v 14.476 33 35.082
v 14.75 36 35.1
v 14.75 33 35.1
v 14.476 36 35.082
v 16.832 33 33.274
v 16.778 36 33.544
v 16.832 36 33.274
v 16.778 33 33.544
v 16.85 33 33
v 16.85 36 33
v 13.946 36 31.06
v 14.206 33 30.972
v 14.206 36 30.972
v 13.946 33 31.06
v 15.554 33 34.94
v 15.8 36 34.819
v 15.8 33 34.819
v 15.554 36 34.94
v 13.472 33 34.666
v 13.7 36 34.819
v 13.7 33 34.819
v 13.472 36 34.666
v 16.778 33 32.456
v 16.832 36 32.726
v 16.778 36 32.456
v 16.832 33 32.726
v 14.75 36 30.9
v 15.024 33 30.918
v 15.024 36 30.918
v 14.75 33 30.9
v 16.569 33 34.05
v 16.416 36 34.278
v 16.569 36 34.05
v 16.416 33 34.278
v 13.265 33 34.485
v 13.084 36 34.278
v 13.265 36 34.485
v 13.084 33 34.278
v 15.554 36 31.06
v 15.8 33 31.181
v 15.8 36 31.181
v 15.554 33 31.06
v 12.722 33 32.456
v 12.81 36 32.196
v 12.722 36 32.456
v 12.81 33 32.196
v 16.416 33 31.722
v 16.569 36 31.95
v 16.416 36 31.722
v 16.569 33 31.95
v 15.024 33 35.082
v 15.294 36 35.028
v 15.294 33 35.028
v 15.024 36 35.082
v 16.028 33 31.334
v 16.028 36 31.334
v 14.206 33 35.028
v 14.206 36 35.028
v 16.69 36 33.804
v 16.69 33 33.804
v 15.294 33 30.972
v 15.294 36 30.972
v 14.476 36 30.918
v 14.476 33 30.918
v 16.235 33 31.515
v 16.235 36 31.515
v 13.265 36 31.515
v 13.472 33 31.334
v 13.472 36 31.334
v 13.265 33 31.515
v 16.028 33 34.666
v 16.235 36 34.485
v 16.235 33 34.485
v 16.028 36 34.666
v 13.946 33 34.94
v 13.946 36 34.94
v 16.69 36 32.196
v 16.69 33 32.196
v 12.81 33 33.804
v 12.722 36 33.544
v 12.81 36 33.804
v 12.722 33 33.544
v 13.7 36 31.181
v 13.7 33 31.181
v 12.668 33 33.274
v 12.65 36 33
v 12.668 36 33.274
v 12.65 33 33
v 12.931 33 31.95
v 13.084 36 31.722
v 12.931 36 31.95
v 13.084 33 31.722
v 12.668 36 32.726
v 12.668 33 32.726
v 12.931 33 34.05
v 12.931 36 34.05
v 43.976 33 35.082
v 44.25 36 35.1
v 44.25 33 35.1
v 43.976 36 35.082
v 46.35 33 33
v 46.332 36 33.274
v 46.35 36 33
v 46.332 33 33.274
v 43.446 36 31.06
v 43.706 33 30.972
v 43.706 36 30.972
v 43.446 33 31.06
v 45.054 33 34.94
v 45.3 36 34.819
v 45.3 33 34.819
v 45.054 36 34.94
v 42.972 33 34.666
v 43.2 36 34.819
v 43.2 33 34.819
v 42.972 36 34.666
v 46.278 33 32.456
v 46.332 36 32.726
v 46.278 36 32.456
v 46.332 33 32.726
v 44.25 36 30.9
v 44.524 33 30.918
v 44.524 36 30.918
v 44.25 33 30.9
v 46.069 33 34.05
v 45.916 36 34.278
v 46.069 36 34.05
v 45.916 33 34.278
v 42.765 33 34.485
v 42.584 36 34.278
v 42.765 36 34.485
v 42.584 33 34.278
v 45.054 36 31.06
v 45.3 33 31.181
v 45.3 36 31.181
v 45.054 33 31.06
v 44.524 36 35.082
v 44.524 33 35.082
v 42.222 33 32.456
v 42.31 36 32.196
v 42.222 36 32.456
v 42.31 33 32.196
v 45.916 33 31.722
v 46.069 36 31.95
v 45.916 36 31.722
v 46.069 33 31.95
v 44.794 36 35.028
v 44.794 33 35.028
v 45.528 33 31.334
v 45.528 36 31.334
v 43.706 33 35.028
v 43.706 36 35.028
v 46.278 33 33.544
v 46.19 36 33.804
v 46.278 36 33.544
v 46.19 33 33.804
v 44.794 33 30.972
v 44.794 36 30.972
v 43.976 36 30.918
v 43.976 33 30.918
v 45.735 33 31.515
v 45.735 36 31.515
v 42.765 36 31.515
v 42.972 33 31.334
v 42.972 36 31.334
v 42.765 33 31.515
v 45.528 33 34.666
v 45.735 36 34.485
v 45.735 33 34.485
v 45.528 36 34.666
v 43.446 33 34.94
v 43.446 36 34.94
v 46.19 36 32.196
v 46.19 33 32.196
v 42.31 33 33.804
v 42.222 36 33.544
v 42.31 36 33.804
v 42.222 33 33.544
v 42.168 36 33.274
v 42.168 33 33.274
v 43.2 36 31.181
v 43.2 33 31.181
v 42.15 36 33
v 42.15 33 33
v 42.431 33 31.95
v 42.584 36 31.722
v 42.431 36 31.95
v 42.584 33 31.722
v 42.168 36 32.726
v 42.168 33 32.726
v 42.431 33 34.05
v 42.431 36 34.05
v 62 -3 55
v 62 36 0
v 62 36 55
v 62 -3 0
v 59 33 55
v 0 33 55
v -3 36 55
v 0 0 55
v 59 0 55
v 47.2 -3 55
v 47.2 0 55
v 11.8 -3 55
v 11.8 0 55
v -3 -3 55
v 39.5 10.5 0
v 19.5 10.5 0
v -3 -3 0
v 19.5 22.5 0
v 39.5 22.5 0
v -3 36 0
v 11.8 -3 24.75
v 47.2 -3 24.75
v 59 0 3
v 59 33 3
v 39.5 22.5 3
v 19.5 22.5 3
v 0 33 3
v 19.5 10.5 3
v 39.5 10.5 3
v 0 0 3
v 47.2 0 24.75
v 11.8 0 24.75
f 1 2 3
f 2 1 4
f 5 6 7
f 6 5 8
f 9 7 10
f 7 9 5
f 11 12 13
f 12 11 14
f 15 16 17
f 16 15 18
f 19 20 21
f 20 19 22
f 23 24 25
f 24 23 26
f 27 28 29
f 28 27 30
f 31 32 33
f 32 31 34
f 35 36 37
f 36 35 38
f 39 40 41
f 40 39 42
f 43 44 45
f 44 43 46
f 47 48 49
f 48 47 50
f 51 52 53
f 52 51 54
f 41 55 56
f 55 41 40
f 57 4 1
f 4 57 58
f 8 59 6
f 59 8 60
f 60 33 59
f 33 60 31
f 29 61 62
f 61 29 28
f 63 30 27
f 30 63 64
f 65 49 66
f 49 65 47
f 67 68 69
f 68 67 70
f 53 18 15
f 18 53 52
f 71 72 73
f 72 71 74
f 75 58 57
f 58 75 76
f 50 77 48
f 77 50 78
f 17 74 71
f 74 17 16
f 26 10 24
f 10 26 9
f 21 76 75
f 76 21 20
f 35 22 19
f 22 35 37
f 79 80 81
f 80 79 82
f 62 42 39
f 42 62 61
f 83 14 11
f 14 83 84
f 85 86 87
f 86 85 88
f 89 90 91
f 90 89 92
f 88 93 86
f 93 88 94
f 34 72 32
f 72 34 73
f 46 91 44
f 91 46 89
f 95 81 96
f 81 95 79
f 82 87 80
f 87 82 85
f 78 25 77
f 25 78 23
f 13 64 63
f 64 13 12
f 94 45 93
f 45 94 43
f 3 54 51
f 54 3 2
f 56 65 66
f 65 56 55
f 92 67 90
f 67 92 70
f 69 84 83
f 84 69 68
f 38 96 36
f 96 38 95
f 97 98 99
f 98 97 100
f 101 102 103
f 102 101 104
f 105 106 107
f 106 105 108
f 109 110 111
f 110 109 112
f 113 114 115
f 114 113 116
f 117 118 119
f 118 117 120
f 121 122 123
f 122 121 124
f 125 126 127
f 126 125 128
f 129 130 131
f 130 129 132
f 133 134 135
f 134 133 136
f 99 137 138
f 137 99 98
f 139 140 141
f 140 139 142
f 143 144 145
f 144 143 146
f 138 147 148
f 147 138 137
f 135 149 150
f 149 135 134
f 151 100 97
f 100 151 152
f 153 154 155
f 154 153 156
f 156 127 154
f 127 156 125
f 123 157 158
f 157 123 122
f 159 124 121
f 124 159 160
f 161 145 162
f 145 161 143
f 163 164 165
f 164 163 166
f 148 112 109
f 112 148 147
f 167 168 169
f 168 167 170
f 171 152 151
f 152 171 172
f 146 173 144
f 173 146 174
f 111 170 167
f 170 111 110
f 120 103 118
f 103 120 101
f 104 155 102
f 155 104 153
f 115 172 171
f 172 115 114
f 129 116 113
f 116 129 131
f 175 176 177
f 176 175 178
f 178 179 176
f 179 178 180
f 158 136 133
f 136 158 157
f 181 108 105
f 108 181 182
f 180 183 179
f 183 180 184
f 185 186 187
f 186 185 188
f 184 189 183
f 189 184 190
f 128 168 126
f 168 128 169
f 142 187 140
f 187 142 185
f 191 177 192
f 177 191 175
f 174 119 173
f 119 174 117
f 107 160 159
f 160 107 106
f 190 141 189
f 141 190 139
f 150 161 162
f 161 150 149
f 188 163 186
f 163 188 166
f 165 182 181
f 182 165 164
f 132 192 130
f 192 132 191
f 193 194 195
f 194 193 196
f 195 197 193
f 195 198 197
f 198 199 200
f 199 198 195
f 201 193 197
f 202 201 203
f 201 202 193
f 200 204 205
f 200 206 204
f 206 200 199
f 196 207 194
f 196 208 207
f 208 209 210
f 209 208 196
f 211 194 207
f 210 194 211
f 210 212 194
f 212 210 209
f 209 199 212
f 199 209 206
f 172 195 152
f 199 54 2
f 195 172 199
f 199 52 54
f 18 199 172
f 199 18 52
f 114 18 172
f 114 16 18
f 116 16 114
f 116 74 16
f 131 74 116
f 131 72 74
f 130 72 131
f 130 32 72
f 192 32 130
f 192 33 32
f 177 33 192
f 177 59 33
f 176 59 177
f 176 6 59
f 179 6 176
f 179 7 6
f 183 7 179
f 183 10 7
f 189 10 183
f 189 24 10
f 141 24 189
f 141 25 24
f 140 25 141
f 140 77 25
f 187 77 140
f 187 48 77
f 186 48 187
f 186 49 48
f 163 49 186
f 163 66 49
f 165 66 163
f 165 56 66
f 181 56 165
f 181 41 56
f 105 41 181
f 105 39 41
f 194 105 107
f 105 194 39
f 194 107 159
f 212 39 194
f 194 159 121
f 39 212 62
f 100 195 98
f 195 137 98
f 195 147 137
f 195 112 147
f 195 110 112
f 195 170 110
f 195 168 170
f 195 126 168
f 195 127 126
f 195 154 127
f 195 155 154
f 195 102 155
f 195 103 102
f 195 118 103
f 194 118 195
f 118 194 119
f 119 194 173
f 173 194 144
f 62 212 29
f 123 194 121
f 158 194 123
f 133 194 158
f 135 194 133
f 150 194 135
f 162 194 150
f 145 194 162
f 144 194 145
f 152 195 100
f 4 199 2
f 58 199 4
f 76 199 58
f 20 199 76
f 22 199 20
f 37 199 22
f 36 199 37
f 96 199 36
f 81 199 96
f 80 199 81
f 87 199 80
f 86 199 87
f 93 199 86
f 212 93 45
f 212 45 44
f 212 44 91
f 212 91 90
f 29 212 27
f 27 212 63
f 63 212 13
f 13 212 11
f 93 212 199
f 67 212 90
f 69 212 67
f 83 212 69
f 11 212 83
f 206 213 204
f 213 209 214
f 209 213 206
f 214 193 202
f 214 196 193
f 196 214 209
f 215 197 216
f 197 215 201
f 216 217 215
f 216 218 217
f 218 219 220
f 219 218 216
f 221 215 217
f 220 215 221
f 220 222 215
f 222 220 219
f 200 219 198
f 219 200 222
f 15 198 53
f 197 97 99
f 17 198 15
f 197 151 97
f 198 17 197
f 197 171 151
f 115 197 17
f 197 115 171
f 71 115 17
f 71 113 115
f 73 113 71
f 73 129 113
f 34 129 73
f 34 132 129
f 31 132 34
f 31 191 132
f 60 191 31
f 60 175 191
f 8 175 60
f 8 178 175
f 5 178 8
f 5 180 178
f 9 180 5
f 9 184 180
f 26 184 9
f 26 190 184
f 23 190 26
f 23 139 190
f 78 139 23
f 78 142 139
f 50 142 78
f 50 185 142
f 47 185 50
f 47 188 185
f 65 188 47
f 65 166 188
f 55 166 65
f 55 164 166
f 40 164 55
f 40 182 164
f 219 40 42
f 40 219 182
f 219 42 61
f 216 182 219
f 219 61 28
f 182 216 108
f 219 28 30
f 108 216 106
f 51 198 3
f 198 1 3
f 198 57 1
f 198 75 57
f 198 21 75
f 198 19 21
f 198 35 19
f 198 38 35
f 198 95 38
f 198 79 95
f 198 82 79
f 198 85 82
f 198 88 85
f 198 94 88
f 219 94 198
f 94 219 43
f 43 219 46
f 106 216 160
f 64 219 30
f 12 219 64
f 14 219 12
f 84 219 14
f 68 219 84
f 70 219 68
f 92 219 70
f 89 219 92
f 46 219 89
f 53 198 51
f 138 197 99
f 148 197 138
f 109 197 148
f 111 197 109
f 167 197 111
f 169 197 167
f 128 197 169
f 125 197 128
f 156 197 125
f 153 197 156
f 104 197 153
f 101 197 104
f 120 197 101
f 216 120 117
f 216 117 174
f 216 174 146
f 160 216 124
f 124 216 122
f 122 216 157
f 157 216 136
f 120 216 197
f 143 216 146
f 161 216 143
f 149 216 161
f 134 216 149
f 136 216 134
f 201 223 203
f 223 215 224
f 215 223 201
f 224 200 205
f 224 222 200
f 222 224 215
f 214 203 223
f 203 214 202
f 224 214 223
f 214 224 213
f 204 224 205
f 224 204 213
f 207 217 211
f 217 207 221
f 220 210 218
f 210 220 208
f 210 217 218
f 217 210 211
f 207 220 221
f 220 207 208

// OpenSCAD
// Handheld radio (HT) cradle for wall, desk or vehicle. CC0.
// Approximate body sizes with battery (MEASURE YOURS, add 1 mm):
//   Baofeng UV-5R / BF-F8+: 58 x 32   Baofeng UV-9R Plus: 58 x 37   AnyTone AT-D868UV: 62 x 36
width = 59; depth = 33; height = 55; wall = 3; screw = 4.2;
$fn = 48;
difference() {
  translate([-wall, -wall, 0]) cube([width + 2 * wall, depth + 2 * wall, height]);
  translate([0, 0, wall]) cube([width, depth, height]);
  translate([width * 0.2, -wall - 1, height * 0.45]) cube([width * 0.6, wall + 2, height]);   // front window (PTT side free)
  translate([width / 2 - 10, depth / 2 - 6, -1]) cube([20, 12, wall + 2]);                   // charge-contact / drain hole
  for (x = [width * 0.25, width * 0.75]) translate([x, depth + wall + 1, height * 0.6]) rotate([90, 0, 0]) cylinder(d = screw, h = wall + 2);
}
